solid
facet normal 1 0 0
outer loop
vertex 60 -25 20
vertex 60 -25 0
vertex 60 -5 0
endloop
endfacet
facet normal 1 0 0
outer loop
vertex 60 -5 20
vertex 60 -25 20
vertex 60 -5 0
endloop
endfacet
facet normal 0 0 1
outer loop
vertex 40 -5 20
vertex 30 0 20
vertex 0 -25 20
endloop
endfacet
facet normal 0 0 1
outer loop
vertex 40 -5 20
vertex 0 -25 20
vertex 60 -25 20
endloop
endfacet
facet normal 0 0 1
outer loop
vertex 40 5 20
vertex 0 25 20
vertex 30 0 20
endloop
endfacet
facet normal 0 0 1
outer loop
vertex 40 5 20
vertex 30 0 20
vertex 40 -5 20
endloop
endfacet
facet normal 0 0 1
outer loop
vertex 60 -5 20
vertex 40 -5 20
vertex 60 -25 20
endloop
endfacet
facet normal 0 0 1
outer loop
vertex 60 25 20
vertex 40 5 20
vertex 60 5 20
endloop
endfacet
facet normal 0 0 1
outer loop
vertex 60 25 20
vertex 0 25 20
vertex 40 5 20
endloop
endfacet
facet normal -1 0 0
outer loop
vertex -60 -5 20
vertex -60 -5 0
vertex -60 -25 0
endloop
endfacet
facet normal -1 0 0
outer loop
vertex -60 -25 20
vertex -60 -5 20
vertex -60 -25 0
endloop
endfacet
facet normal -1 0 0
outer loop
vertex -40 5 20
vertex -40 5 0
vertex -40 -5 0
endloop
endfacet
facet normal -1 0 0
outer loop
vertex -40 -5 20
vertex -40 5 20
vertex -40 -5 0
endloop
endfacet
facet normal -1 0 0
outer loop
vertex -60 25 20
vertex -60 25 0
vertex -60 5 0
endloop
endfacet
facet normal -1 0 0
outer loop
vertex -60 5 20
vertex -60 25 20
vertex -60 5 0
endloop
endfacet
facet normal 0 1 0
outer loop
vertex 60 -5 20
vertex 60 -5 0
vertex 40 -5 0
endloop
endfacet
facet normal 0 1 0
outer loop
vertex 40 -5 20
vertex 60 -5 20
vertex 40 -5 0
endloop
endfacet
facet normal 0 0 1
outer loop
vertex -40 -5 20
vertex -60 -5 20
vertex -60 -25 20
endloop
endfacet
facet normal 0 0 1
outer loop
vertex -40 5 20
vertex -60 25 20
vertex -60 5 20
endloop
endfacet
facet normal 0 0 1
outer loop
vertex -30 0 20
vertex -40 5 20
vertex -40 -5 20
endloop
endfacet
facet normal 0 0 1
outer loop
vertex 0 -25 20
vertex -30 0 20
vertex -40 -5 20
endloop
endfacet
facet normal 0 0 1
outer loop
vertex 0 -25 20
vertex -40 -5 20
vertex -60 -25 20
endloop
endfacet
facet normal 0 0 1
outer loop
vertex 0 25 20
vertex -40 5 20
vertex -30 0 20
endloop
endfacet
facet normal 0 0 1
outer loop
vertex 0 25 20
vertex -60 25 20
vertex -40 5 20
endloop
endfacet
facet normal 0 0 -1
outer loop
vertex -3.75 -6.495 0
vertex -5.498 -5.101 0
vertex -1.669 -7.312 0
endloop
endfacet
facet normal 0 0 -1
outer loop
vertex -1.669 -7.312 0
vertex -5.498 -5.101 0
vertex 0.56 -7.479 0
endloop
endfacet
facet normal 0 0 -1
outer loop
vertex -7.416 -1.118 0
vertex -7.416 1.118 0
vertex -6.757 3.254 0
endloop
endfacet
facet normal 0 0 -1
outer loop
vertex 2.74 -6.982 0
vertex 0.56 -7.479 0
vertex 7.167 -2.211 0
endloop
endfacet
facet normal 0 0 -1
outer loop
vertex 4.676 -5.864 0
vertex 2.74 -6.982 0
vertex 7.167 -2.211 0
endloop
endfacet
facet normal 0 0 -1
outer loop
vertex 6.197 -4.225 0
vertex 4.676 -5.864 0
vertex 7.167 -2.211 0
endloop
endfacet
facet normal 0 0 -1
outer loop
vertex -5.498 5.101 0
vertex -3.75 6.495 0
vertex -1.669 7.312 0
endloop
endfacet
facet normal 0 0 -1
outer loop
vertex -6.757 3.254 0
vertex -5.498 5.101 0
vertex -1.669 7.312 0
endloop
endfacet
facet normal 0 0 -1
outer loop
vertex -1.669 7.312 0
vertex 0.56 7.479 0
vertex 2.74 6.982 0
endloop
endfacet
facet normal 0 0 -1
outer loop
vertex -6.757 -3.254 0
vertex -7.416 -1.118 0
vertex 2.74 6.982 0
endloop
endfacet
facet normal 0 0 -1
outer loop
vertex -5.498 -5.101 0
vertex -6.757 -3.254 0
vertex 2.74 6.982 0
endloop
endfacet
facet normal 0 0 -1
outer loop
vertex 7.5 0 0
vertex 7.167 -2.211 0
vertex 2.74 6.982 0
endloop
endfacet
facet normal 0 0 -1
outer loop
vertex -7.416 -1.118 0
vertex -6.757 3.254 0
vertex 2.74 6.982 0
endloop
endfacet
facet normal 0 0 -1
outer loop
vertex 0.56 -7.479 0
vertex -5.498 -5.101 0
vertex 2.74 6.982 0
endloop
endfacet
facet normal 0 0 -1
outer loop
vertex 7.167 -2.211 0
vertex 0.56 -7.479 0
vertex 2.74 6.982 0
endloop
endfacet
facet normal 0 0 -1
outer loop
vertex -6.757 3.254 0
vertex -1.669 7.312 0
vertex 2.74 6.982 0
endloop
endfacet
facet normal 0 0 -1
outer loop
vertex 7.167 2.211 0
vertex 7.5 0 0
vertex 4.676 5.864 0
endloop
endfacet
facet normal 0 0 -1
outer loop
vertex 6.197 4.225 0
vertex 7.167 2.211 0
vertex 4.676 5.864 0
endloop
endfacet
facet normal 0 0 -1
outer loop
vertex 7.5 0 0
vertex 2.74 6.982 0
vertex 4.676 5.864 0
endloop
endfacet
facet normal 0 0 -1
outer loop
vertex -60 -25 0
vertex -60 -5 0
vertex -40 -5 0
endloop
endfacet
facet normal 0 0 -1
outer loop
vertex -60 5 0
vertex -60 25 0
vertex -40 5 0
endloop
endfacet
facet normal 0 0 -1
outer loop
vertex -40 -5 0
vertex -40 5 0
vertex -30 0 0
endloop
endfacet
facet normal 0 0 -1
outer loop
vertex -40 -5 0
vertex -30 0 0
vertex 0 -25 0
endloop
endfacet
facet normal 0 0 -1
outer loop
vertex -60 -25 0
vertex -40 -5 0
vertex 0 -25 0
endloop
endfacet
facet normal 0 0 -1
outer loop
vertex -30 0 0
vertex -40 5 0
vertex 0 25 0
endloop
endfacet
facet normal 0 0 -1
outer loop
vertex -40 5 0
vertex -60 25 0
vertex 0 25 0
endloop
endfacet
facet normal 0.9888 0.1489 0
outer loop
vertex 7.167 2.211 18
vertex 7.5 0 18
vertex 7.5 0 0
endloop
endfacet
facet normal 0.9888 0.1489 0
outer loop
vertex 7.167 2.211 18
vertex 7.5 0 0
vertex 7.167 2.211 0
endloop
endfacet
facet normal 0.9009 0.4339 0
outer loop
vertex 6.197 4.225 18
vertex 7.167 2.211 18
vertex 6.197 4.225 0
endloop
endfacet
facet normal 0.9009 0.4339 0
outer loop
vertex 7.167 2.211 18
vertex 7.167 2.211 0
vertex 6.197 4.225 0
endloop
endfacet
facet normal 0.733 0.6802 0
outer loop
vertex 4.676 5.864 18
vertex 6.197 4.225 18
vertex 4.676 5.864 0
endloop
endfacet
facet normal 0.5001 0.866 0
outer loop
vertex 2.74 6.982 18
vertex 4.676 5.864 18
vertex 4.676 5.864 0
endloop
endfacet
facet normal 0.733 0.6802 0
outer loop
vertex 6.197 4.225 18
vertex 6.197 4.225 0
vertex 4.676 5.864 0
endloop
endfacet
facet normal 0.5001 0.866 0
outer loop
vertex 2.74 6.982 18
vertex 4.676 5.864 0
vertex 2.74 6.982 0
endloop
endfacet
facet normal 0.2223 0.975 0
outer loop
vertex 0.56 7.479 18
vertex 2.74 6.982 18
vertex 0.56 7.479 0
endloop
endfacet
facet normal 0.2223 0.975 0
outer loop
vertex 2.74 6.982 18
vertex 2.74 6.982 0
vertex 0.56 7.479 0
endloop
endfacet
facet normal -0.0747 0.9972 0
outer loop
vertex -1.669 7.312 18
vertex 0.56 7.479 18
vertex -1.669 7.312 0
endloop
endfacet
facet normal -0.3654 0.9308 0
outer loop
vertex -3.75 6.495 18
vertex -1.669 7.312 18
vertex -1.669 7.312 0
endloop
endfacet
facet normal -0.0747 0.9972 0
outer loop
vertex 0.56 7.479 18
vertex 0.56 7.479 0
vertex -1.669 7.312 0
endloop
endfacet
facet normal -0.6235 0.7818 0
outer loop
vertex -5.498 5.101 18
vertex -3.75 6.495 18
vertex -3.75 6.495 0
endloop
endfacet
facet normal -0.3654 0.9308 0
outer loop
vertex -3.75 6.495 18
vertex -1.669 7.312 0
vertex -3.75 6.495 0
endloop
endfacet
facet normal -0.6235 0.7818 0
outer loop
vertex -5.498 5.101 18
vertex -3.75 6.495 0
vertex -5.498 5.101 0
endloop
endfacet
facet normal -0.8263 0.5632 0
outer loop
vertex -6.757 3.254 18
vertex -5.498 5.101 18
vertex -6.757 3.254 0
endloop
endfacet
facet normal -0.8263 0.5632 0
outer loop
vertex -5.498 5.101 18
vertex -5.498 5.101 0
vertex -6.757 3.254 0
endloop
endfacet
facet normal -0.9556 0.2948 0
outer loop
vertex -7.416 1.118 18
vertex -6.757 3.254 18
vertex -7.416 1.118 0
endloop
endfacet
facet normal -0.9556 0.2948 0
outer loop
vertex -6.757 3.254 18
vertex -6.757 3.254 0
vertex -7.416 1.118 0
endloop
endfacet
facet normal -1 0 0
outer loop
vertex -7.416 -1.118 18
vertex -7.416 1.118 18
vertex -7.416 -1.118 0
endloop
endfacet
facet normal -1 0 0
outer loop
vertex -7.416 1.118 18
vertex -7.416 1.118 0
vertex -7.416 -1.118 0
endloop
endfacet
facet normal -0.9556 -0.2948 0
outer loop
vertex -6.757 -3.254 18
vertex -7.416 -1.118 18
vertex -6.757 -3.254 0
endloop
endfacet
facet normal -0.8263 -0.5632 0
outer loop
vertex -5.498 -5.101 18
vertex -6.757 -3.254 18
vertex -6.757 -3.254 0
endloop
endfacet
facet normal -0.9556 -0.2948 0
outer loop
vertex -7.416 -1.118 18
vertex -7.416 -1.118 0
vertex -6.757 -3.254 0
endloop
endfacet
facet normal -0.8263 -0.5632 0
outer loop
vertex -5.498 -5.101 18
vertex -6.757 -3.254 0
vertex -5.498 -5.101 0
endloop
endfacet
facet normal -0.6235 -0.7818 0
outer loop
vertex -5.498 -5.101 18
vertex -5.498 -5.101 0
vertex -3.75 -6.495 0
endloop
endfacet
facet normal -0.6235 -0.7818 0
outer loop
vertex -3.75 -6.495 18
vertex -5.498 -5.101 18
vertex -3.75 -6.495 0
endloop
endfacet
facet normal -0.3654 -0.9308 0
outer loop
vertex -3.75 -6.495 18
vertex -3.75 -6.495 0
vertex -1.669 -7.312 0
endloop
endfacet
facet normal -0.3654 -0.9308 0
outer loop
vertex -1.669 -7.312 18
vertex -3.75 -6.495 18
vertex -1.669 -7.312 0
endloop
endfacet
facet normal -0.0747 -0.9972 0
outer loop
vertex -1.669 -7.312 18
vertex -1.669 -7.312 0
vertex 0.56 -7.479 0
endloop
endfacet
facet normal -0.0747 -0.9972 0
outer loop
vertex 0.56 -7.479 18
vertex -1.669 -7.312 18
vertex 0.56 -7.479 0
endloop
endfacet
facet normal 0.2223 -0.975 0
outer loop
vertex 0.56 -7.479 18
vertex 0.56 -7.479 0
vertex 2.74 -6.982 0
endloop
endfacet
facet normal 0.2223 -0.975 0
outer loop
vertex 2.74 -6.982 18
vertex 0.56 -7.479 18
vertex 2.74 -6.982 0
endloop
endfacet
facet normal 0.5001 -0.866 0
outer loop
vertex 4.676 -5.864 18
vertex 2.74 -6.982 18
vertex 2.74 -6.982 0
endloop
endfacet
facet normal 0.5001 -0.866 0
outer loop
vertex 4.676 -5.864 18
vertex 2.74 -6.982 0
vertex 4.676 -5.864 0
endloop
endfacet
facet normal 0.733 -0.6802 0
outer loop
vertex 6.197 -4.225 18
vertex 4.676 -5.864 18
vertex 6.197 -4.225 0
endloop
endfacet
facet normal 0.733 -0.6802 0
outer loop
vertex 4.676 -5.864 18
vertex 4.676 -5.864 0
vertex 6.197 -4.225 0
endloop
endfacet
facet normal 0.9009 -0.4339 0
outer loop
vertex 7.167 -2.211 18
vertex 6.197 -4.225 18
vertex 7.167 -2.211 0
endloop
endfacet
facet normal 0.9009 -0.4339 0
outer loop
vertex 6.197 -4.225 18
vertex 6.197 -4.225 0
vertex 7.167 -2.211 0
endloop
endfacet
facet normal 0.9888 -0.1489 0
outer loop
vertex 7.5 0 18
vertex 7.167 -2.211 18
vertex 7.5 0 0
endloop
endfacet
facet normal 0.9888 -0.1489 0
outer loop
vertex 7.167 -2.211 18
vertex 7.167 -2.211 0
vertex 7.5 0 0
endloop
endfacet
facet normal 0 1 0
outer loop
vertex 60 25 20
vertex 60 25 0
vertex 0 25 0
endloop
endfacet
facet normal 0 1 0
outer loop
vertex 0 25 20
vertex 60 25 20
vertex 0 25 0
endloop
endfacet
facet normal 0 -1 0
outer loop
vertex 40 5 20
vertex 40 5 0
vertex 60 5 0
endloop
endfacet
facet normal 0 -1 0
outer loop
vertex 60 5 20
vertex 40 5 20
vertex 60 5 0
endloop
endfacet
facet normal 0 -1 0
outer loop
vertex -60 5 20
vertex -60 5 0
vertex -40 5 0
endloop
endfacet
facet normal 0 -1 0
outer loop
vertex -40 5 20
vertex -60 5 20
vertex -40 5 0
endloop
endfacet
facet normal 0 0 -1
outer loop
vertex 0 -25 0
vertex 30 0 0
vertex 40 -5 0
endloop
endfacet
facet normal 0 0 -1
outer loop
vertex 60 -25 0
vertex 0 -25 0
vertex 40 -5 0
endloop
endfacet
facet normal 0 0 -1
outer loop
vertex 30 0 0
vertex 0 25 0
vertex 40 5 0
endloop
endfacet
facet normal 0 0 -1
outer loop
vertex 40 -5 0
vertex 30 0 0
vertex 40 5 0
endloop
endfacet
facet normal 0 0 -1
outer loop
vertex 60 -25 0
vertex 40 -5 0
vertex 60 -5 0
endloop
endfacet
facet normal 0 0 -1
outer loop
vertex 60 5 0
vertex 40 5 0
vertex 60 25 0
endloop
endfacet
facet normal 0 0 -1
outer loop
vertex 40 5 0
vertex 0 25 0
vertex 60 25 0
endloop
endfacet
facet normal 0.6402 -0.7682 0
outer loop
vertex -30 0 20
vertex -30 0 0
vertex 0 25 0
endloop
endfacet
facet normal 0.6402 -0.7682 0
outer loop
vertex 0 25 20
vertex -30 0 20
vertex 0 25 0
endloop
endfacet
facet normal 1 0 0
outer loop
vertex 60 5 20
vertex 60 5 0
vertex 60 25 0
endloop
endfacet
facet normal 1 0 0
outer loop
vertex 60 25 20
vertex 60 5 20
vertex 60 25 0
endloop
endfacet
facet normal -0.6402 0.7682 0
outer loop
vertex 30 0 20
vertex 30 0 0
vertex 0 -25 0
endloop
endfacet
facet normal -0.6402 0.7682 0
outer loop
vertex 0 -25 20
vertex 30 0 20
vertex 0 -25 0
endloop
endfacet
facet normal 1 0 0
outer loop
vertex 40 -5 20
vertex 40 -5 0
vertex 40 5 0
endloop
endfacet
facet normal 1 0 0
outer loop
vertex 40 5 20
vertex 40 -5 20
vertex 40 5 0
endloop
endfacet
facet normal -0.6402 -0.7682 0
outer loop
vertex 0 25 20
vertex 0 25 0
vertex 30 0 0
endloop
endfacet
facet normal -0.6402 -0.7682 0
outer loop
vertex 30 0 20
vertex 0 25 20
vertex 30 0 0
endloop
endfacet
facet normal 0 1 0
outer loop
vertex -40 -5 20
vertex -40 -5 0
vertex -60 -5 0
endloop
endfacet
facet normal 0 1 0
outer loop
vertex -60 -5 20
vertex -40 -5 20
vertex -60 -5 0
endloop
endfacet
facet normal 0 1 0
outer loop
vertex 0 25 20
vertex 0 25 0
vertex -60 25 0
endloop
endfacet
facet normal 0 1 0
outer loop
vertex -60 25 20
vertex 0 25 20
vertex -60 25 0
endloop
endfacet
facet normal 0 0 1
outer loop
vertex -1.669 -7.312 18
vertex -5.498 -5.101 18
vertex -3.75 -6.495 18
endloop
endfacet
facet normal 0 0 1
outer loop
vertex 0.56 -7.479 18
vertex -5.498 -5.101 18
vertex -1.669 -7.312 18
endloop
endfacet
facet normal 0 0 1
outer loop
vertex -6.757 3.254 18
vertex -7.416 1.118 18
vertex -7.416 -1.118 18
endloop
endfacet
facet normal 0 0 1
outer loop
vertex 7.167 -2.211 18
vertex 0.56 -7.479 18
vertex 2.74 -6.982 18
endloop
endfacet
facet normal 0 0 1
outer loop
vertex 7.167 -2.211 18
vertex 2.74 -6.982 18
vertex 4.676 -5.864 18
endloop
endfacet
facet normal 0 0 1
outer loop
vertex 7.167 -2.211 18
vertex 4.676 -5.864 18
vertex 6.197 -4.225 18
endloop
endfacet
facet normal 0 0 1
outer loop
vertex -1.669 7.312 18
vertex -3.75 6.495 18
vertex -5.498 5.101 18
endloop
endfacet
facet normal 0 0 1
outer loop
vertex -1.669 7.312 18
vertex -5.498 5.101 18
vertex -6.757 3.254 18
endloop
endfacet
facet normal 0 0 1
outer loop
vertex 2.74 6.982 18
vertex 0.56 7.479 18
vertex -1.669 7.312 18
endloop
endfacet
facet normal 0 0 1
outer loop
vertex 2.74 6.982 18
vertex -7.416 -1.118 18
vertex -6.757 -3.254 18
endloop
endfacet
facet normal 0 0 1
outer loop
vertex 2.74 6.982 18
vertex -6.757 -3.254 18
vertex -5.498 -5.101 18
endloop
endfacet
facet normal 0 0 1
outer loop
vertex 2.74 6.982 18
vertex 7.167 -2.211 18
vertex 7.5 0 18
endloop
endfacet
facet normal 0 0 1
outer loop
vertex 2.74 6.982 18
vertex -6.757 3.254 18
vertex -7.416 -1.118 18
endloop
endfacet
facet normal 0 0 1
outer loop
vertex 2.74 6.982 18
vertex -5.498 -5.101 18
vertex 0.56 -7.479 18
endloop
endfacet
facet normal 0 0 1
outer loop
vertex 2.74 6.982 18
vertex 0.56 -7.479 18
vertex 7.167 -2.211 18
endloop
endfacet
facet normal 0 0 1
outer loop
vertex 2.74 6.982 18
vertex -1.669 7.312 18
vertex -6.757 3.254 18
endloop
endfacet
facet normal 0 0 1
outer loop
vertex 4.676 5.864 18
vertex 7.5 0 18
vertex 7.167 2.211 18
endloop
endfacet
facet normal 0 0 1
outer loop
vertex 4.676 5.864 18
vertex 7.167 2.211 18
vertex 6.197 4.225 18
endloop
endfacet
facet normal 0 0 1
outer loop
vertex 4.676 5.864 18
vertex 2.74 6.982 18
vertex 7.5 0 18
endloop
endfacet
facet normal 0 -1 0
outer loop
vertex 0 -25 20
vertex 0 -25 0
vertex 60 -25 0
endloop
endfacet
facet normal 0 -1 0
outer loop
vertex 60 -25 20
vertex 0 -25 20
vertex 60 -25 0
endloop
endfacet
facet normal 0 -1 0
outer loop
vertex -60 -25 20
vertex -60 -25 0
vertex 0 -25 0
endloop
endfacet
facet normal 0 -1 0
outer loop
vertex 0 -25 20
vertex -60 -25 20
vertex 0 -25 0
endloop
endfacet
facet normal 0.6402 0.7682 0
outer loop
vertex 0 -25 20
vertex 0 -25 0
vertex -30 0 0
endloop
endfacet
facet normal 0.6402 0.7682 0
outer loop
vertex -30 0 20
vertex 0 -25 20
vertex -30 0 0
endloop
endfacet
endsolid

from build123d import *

# Parameters (mm, degrees)
F1_DEPTH = 20
F2_R     = 7.5
F3_DEPTH = 18


with BuildPart() as f1:
    # F0 (on Top) → F1 (new body)
    with BuildSketch(Plane.XY):
        Polygon((30, 0), (30, -25), (60, -25), (60, -5), (40, -5), (40, 5), (60, 5), (60, 11.190053), (60, 25), (30, 25), align=None)
        Polygon((30, 0), (0, -25), (30, -25), align=None)
        Polygon((-30, 0), (-30, -25), (0, -25), align=None)
        Polygon((-30, 25), (-30, 0), (0, 25), align=None)
        Polygon((0, 25), (30, 0), (30, 25), align=None)
        Polygon((-60, -25), (-30, -25), (-30, 0), (-30, 25), (-60, 25), (-60, 5), (-40, 5), (-40, -5), (-60, -5), align=None)
    extrude(amount=F1_DEPTH)


with BuildPart() as f3:
    # F2 (on Top) → F3 (new body)
    with BuildSketch(Plane.XY):
        Circle(F2_R)
    extrude(amount=F3_DEPTH)


solid = Compound([f1.part, f3.part])
